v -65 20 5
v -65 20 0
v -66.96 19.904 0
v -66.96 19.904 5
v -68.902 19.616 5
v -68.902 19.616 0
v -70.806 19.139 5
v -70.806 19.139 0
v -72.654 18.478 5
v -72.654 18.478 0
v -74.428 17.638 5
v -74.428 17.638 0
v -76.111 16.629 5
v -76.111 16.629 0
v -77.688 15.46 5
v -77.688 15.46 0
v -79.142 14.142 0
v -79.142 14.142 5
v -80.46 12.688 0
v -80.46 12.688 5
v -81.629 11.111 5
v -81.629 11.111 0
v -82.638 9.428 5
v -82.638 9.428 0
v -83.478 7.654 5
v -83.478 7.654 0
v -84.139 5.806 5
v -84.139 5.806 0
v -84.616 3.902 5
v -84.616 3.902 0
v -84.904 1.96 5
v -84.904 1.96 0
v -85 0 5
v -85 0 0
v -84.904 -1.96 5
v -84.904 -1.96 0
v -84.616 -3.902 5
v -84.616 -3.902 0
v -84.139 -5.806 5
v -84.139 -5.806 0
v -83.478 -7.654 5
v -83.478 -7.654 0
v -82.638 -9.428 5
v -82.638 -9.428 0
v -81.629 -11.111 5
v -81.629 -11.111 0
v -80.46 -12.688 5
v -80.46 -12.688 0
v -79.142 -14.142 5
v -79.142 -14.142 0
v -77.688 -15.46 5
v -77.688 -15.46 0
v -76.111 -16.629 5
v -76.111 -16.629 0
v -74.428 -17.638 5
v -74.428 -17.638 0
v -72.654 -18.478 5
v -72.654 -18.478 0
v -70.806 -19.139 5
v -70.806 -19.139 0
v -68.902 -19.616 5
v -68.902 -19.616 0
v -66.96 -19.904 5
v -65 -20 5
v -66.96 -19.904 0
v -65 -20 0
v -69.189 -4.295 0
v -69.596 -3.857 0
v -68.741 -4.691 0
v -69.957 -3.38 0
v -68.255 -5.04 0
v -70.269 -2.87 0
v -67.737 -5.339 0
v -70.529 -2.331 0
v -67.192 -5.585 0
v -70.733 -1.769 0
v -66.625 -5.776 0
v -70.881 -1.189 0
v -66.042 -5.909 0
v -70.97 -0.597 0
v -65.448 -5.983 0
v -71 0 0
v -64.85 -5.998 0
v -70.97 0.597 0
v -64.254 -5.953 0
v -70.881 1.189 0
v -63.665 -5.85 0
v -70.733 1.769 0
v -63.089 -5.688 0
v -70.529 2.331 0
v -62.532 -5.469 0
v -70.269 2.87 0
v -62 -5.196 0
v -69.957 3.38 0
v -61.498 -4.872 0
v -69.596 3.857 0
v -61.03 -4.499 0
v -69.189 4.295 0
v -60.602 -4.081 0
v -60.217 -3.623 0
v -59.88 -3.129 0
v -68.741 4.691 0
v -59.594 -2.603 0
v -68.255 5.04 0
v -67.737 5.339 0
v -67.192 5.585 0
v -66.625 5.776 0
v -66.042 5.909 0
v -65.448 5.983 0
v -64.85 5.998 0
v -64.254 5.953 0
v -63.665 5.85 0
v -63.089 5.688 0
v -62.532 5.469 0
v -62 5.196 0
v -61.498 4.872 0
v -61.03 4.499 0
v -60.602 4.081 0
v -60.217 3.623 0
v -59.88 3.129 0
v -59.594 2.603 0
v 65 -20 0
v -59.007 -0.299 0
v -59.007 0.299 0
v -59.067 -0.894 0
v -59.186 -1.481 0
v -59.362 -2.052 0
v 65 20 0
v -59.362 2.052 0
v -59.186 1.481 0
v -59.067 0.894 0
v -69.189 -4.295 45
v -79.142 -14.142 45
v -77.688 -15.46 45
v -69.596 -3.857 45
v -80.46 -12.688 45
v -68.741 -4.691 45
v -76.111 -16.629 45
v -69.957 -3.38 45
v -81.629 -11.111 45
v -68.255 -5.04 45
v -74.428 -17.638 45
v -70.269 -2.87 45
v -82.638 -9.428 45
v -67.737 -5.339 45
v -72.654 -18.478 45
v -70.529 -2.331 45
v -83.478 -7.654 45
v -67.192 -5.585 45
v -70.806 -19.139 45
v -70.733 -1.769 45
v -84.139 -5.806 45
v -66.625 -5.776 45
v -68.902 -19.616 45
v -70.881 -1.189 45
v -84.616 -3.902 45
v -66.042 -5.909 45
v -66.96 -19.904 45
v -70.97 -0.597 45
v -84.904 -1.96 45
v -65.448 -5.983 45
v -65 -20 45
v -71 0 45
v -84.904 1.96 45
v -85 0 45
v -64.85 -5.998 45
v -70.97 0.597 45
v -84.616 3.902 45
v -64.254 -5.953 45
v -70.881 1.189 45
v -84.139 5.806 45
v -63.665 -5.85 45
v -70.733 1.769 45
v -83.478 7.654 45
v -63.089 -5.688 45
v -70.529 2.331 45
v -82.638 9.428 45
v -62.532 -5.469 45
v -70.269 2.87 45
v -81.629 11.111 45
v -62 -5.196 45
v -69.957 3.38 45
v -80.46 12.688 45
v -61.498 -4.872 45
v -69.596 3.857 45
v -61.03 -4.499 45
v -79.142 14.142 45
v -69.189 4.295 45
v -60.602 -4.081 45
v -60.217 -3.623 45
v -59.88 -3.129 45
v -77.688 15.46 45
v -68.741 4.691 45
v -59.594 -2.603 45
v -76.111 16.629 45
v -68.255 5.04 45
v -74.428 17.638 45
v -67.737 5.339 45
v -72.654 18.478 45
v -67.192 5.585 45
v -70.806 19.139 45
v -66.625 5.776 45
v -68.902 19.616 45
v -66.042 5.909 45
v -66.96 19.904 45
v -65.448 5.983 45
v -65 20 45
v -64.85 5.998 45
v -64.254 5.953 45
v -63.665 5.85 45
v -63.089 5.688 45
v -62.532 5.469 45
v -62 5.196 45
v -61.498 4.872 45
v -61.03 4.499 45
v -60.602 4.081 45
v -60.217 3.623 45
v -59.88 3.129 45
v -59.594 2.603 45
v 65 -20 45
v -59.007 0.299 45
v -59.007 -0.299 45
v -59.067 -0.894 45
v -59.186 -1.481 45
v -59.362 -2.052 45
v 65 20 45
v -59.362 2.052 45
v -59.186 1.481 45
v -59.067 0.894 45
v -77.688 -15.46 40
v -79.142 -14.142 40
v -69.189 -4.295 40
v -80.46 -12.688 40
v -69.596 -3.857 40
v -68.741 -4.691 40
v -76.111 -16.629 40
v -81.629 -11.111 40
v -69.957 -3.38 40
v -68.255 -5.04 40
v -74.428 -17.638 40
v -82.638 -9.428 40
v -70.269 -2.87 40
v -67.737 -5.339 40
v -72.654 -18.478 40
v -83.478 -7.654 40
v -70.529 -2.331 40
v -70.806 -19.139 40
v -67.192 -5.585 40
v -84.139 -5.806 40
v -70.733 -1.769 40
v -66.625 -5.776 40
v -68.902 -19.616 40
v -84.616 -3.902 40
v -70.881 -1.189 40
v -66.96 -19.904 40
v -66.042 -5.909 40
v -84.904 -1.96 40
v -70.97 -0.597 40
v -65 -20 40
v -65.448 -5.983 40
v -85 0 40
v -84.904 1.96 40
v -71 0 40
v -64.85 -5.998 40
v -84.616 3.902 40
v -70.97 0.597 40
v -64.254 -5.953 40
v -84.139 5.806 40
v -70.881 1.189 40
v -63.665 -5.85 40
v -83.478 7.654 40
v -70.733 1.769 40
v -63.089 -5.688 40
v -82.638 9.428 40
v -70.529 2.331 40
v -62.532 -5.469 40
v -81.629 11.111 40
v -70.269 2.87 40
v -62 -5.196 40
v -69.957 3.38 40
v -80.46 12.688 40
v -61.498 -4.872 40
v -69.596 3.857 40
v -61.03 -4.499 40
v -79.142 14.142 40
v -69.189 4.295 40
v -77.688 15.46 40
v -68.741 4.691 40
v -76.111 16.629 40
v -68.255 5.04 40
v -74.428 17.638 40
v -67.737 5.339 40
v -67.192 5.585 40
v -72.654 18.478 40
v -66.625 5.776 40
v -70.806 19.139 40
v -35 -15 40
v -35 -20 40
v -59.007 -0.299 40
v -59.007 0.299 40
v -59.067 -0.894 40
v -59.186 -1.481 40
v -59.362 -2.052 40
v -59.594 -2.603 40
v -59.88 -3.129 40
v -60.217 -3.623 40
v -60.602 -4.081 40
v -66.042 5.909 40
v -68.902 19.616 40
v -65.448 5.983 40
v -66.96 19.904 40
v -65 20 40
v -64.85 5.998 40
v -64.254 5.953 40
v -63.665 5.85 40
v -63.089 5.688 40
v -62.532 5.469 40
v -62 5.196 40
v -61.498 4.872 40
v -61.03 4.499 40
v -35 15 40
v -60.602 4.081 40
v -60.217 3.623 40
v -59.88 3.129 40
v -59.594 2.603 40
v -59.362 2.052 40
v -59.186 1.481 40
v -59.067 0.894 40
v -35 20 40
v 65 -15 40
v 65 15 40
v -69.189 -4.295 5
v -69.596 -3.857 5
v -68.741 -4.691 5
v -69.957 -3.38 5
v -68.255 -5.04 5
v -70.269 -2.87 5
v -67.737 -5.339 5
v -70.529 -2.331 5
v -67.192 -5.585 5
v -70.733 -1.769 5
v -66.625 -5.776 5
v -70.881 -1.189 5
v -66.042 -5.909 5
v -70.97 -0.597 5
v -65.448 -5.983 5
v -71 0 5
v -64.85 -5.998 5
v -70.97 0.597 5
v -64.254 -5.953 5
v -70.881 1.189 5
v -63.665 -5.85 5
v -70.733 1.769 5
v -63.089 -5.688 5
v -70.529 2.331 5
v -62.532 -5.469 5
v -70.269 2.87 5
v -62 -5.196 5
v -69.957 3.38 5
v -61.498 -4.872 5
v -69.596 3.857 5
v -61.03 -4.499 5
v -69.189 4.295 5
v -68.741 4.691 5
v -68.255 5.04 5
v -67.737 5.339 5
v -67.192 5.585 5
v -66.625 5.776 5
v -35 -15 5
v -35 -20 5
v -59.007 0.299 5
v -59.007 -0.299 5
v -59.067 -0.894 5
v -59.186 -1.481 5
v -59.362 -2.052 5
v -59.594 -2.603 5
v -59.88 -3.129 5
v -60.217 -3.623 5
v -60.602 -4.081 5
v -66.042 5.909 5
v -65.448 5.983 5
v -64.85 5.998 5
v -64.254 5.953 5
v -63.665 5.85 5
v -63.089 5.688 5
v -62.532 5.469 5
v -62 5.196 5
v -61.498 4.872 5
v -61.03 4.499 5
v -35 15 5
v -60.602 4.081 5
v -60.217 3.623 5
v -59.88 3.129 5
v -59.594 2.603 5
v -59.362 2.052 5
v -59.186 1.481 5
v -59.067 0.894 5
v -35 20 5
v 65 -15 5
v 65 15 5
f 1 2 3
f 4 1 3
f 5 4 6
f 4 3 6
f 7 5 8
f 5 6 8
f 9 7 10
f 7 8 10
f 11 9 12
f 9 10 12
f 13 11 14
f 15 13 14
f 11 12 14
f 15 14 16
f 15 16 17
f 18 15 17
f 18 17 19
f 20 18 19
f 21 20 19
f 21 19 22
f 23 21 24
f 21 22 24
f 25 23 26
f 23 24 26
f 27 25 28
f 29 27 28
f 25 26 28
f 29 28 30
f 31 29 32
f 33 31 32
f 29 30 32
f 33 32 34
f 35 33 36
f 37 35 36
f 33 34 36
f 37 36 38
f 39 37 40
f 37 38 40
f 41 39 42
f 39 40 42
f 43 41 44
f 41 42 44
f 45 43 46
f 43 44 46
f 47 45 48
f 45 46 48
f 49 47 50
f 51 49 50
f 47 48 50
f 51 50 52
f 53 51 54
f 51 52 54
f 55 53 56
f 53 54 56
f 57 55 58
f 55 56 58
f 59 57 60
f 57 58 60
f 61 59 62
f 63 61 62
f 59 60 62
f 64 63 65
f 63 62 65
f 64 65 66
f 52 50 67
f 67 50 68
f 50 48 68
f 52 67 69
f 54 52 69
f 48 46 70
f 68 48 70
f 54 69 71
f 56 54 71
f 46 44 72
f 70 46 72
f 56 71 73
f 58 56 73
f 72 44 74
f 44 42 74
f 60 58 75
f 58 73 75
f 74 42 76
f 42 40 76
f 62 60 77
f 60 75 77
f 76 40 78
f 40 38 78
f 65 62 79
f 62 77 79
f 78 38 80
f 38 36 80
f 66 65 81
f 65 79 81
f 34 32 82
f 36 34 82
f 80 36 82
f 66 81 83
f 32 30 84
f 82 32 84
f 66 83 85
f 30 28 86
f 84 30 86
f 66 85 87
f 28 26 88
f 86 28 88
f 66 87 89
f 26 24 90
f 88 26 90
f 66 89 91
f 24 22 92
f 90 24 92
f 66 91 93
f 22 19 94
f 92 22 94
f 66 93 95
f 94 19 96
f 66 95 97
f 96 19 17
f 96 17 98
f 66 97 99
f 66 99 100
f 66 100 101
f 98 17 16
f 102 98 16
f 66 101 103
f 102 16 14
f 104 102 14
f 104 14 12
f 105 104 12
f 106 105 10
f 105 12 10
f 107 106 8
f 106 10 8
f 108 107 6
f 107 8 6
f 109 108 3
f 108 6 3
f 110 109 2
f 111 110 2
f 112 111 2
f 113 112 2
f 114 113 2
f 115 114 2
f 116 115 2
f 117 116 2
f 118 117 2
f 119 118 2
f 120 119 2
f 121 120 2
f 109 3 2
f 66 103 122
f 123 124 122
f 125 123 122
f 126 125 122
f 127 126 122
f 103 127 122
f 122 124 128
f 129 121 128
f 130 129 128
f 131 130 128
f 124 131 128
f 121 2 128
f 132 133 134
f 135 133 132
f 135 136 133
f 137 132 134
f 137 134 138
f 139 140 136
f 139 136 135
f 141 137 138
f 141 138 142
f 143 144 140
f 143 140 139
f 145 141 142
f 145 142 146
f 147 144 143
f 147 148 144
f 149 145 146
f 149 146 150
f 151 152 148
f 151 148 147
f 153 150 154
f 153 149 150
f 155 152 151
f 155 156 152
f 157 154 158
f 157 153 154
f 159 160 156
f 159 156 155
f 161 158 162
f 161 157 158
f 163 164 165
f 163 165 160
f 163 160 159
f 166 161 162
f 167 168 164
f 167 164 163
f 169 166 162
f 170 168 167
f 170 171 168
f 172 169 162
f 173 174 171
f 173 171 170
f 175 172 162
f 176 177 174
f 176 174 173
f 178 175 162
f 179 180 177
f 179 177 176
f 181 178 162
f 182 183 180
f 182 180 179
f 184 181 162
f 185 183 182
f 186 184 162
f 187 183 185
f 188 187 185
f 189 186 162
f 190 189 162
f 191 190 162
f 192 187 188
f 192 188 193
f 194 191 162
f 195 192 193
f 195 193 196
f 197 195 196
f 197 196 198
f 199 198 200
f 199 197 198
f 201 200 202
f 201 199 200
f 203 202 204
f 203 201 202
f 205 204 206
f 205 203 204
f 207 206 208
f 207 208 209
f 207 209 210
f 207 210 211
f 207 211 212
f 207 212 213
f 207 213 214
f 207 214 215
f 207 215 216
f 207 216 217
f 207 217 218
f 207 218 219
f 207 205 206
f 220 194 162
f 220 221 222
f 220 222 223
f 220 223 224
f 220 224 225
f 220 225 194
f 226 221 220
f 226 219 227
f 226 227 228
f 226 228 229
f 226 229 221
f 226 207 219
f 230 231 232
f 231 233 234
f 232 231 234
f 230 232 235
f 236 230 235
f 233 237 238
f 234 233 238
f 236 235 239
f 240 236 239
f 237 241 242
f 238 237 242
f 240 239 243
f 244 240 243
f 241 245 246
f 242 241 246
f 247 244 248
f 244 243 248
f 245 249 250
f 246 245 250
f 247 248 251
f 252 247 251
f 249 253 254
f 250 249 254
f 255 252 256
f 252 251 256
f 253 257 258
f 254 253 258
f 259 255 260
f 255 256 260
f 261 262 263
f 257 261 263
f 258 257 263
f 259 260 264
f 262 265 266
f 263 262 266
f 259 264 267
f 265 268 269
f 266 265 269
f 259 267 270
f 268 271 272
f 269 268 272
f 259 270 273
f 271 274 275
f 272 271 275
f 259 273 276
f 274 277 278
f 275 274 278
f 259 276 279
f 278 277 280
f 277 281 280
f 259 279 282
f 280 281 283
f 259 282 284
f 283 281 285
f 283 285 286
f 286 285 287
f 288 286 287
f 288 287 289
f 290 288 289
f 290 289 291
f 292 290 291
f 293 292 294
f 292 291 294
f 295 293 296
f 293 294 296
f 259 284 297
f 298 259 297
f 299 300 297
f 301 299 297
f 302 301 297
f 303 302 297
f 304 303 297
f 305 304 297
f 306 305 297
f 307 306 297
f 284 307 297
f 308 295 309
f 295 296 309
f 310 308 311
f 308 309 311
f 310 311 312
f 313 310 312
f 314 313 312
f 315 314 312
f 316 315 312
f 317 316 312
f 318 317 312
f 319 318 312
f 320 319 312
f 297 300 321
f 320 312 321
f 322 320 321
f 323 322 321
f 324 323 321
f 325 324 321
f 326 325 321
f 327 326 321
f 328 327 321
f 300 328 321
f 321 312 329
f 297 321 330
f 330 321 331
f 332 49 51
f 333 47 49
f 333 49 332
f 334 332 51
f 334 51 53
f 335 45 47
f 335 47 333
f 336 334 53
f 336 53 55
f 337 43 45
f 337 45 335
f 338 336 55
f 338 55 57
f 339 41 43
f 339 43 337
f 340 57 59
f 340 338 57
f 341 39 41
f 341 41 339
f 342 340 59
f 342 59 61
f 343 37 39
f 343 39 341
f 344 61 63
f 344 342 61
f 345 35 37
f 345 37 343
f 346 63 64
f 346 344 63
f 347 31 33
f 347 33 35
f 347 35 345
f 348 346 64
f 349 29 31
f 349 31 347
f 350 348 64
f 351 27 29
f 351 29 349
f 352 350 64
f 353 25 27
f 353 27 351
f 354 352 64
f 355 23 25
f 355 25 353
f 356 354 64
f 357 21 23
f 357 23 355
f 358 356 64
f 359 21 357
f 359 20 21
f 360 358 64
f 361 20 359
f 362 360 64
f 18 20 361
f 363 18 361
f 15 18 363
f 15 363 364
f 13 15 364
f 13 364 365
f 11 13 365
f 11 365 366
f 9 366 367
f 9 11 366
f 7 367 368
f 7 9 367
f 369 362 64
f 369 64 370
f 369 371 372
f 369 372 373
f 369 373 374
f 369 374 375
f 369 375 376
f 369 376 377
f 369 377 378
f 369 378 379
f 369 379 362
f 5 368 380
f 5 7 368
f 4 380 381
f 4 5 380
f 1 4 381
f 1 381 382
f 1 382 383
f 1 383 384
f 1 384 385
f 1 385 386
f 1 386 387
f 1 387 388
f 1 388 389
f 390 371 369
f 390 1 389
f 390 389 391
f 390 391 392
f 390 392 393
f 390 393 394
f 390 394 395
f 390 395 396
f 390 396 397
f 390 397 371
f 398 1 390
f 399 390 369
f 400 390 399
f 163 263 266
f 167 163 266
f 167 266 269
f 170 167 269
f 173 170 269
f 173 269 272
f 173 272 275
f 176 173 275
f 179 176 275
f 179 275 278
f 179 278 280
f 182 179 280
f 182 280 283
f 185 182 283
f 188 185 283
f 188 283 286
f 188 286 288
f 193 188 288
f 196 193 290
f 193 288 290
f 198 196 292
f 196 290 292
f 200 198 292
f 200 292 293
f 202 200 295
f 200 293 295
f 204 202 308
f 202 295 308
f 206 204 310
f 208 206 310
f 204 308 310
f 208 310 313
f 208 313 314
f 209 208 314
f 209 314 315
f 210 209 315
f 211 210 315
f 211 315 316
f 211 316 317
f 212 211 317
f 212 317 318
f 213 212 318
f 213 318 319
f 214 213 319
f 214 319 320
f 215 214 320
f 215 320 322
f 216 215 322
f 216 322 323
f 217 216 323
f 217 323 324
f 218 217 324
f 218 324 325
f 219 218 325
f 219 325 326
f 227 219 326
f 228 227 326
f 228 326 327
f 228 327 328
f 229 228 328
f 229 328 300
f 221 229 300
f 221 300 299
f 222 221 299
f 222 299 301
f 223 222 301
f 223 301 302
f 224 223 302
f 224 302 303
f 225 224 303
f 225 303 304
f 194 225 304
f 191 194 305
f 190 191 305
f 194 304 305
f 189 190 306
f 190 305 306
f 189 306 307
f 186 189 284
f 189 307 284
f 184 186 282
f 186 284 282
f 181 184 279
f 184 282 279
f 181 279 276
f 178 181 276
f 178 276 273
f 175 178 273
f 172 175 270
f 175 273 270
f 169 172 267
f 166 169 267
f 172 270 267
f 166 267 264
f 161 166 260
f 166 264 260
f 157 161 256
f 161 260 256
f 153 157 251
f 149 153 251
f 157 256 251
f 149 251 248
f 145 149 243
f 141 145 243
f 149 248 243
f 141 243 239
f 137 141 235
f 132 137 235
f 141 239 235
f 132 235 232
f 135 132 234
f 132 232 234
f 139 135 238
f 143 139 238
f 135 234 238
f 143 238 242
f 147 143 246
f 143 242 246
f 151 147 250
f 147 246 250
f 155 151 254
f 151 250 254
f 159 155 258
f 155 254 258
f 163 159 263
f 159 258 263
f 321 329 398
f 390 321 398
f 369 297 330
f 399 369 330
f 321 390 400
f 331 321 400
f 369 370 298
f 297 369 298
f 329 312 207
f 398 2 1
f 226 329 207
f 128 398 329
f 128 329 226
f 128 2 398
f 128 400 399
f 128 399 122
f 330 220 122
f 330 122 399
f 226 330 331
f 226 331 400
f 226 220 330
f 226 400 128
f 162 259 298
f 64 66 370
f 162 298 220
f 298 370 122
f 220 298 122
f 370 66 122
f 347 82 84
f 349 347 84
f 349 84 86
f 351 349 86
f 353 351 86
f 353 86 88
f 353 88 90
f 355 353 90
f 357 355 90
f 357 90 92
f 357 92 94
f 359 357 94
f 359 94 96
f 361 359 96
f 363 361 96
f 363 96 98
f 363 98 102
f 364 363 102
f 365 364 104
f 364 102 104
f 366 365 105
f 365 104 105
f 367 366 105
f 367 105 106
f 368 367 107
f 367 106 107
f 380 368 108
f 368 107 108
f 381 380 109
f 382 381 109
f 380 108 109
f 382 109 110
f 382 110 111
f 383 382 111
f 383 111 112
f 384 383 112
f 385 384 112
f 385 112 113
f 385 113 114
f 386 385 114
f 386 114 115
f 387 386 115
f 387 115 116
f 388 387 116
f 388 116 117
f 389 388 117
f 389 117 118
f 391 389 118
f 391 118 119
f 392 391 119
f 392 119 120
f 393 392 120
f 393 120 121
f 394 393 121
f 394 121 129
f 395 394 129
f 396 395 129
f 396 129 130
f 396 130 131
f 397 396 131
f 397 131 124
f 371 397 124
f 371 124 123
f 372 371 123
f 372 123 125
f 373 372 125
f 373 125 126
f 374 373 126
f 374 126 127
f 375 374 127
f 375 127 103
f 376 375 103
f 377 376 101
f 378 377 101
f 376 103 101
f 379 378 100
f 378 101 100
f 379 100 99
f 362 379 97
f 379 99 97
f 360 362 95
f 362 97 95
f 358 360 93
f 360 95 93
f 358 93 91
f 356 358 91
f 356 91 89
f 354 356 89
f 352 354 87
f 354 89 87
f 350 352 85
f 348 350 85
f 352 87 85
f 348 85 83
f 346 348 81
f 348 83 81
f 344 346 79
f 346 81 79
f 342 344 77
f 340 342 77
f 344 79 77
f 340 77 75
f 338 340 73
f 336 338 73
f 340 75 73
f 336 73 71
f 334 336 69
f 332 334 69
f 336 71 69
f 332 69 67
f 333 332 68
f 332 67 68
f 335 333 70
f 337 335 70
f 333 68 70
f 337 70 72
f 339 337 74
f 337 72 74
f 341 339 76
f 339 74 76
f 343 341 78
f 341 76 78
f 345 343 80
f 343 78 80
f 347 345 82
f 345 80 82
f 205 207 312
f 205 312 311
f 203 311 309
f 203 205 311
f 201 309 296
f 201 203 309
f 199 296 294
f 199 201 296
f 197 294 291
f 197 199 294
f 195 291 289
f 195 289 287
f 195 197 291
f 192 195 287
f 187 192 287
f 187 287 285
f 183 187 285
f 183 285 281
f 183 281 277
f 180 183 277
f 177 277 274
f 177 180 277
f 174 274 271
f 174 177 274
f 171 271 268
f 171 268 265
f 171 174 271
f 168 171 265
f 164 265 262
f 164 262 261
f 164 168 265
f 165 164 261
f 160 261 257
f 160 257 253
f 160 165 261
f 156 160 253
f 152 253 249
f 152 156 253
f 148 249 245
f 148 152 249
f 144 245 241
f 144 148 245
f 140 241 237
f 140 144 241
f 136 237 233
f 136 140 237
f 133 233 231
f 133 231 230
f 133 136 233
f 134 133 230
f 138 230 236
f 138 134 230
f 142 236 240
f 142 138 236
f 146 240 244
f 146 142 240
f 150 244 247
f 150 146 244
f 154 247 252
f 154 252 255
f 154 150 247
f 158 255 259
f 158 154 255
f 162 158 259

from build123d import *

# Parameters (mm, degrees)
DODANIE_WYCI_GNI_CIE1_DEPTH = 5
SZKIC2_W                    = 100
SZKIC2_H                    = 35
DODANIE_WYCI_GNI_CIE2_DEPTH = 5
SZKIC3_R                    = 6
WYTNIJ_WYCI_GNI_CIE1_DEPTH  = 99.234413522
SZKIC4_W                    = 100
SZKIC4_H                    = 40
DODANIE_WYCI_GNI_CIE3_DEPTH = 5


with BuildPart() as part:
    # Szkic1 → Dodanie-wyciągnięcie1 (new body)
    with BuildSketch(Plane.XY):
        with BuildLine():
            Line((-65, -20), (65, -20))
            Line((65, -20), (65, 20))
            Line((65, 20), (-65, 20))
            ThreePointArc((-65, 20), (-85, 0), (-65, -20))
        make_face()
    extrude(amount=DODANIE_WYCI_GNI_CIE1_DEPTH)


with BuildPart() as body_2:
    # Lustro2: mirrored copy
    add(part.part.mirror(Plane.XY.offset(22.5)))


with BuildPart() as part_1:
    add(part.part)

    add(body_2.part)  # Dodanie-wyciągnięcie2 merges body 2
    # Szkic2 → Dodanie-wyciągnięcie2 (add)
    with BuildSketch(Plane(origin=(0, 20, 0), x_dir=(1, 0, 0), z_dir=(0, 1, 0))):
        with Locations((15, -22.5)):
            Rectangle(SZKIC2_W, SZKIC2_H)
    extrude(amount=-DODANIE_WYCI_GNI_CIE2_DEPTH)

    # Szkic3 → Wytnij-wyciągnięcie1 (cut, through all)
    with BuildSketch(Plane(origin=(0, 0, 0), x_dir=(-1, 0, 0), z_dir=(0, 0, -1))):
        with Locations((65, 0)):
            Circle(SZKIC3_R)
    extrude(amount=-WYTNIJ_WYCI_GNI_CIE1_DEPTH, mode=Mode.SUBTRACT)

    # Szkic4 → Dodanie-wyciągnięcie3 (add)
    with BuildSketch(Plane.XZ.offset(20)):
        with Locations((15, 20)):
            Rectangle(SZKIC4_W, SZKIC4_H)
    extrude(amount=-DODANIE_WYCI_GNI_CIE3_DEPTH)


solid = part_1.part
